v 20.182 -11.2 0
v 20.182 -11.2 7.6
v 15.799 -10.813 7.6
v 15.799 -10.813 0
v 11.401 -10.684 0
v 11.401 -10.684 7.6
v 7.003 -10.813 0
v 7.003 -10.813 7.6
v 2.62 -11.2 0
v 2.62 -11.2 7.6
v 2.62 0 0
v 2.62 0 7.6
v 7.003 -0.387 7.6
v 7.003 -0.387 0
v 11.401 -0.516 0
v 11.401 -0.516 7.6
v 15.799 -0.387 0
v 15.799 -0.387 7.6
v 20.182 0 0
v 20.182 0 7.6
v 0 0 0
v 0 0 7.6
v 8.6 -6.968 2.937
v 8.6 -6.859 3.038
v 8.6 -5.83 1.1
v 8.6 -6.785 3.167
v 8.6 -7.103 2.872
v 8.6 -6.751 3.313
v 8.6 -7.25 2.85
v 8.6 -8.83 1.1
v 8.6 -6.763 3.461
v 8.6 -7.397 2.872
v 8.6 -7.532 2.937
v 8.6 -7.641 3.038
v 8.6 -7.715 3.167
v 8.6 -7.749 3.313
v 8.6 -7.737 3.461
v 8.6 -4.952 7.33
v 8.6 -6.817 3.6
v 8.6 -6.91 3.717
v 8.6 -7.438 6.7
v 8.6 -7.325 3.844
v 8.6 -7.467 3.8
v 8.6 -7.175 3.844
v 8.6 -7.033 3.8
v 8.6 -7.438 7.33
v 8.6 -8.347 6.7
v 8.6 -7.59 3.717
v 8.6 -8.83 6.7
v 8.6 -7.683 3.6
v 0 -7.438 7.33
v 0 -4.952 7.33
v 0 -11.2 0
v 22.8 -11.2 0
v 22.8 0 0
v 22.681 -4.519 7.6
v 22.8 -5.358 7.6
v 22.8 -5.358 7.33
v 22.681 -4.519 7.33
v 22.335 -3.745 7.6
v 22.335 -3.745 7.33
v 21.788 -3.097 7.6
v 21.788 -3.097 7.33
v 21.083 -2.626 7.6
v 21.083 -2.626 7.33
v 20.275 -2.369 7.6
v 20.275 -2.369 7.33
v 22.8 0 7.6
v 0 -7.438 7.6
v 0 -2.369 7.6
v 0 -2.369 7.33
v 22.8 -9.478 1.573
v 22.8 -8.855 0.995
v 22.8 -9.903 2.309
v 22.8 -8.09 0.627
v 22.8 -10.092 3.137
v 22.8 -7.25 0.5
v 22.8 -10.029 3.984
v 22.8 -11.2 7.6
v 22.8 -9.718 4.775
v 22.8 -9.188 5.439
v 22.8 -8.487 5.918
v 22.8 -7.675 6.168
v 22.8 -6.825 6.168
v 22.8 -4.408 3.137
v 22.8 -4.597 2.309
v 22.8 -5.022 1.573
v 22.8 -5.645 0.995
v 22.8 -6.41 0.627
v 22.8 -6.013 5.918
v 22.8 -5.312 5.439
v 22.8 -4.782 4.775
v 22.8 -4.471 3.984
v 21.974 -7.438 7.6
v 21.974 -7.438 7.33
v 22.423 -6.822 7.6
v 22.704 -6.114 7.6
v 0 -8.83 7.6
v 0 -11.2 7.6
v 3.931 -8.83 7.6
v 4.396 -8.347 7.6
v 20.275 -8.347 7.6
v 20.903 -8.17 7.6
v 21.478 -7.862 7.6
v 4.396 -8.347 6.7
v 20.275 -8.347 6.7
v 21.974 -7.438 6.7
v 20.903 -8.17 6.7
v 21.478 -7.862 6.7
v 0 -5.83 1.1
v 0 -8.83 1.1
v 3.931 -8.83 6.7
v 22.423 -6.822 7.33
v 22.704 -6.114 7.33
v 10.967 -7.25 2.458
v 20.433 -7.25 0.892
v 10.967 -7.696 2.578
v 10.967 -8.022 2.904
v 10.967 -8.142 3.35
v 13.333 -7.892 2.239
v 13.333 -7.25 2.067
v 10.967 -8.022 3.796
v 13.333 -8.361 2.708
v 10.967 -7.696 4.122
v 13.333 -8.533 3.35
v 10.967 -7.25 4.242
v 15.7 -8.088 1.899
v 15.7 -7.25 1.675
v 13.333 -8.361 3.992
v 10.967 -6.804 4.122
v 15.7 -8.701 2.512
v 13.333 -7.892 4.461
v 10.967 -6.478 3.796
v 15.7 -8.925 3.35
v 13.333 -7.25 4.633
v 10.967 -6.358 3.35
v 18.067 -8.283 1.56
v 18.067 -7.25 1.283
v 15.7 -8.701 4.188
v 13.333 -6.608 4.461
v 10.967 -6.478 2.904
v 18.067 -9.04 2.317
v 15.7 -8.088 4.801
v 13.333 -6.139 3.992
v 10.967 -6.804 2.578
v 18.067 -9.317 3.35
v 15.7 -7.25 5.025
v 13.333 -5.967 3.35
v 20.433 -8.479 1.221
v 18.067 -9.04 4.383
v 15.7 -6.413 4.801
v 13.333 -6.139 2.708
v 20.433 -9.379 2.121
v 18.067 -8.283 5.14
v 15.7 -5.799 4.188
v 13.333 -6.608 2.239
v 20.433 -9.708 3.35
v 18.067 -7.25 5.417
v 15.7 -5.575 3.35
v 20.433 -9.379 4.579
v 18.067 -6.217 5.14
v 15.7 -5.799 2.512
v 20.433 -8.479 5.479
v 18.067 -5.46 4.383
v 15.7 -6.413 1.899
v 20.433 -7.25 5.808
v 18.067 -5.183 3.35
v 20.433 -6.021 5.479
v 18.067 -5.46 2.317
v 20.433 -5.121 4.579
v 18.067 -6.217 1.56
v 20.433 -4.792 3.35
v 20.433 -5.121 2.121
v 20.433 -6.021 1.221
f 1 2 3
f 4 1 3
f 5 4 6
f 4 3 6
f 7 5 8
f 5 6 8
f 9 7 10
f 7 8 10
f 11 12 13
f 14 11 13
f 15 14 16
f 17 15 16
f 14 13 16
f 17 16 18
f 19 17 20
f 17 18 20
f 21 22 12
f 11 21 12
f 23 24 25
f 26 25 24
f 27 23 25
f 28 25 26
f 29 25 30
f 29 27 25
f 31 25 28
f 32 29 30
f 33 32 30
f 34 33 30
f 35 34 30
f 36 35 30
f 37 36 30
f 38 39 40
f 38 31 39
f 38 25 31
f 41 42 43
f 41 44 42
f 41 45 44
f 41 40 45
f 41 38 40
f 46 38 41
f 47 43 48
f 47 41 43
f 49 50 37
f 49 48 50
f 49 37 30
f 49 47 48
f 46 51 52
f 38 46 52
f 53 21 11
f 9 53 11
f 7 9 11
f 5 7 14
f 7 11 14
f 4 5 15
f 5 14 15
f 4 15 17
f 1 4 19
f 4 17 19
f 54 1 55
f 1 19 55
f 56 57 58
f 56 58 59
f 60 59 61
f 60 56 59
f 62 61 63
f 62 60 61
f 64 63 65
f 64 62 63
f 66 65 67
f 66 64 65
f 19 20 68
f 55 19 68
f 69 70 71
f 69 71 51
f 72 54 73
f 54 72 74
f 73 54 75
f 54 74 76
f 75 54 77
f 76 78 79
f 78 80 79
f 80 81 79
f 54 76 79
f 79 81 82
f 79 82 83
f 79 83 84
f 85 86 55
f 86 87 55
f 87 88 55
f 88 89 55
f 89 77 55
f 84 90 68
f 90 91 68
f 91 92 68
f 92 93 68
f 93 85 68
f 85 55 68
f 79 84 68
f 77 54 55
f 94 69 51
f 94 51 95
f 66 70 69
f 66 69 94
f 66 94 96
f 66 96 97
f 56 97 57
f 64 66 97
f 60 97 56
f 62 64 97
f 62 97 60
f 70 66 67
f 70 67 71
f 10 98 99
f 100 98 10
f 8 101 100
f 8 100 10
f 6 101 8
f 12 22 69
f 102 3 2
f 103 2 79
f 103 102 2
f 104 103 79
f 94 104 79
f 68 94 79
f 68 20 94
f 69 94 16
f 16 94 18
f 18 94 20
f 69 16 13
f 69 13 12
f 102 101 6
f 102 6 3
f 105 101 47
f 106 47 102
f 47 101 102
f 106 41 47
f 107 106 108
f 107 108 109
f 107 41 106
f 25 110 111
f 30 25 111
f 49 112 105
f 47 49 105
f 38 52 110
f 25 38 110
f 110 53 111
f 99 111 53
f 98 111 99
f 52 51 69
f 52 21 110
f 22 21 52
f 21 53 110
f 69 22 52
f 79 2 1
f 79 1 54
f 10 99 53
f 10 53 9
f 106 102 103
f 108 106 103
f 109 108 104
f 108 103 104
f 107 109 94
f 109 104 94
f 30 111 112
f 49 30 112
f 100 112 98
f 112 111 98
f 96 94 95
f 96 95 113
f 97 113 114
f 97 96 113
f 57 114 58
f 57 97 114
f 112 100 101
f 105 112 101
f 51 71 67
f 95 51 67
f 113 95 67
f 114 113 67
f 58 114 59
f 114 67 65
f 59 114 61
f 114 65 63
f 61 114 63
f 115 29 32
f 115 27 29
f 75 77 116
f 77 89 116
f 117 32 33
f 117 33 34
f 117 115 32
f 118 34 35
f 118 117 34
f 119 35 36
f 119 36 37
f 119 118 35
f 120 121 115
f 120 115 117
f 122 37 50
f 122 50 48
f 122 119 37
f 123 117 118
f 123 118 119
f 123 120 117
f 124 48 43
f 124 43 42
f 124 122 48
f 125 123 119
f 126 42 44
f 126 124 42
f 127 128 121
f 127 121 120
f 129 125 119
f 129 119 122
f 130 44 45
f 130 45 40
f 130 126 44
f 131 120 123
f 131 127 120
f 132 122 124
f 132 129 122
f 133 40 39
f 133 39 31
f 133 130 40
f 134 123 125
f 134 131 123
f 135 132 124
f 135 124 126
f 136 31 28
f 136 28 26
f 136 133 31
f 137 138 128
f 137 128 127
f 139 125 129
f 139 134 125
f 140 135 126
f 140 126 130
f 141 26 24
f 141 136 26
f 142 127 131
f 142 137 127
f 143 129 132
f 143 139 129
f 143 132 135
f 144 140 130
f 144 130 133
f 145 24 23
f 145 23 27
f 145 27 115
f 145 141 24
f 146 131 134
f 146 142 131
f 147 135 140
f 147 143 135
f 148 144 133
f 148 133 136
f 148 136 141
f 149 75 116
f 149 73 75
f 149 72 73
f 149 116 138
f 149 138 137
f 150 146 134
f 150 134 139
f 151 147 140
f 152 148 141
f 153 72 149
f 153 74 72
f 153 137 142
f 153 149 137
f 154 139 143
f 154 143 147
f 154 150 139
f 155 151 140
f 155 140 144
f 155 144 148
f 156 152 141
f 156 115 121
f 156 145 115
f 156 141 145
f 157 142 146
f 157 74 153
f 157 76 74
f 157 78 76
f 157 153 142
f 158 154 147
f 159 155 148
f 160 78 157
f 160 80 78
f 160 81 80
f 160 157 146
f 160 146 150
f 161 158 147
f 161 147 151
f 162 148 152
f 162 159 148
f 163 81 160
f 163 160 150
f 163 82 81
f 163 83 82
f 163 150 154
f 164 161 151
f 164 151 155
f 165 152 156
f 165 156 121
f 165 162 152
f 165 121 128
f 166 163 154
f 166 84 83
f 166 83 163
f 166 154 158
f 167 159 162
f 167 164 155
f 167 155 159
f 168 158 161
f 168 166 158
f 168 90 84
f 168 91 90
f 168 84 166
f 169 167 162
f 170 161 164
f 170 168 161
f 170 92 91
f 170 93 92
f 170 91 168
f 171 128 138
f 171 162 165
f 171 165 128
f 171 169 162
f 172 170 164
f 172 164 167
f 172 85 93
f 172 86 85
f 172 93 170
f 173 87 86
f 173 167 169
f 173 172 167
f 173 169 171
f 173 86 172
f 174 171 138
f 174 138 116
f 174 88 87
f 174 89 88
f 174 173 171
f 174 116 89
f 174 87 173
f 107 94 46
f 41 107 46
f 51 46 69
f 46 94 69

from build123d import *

# Parameters (mm, degrees)
F0_W      = 22.8
F0_H      = 7.6
F1_DEPTH  = 11.2
F7_DEPTH  = 0.9
F9_DEPTH  = 8.6
F10_DEPTH = 7.6
F11_DEPTH = 7.6
F12_DEPTH = 0.27


with BuildPart() as f1:
    # F0 (on Front) → F1 (new body)
    with BuildSketch(Plane.XZ):
        with Locations((11.4, 3.8)):
            Rectangle(F0_W, F0_H)
    extrude(amount=F1_DEPTH)

    # F4 (on offset) → F5 (revolve, cut)
    with BuildSketch(Plane.XZ.offset(7.25)):
        Polygon((8.6, 2.85), (22.8, 0.5), (22.8, 3.35), (8.6, 3.35), align=None)
    revolve(axis=Axis((15.7, -7.25, 3.35), (-1, 0, 0)), mode=Mode.SUBTRACT)

    # F6 (on face) → F7 (cut)
    with BuildSketch(Plane.XY.offset(7.6)):
        with BuildLine():
            Line((21.9739718918, -7.4381930754), (0, -7.4381930754))
            Line((0, -7.4381930754), (0, -8.83))
            Line((0, -8.83), (3.9305342361, -8.83))
            Line((3.9305342361, -8.83), (4.396331734, -8.3473995328))
            Line((4.396331734, -8.3473995328), (20.2752824453, -8.3473995328))
            ThreePointArc((20.2752824453, -8.3473995328), (21.1987672729, -8.0313138122), (21.9739718918, -7.4381930754))
        make_face()
    extrude(amount=-F7_DEPTH, mode=Mode.SUBTRACT)

    # F8 (on face) → F9 (cut)
    with BuildSketch(Plane(origin=(0, 0, 0), x_dir=(0, -1, 0), z_dir=(-1, 0, 0))):
        Polygon((4.9516418949, 7.3297983035), (5.83, 1.1), (8.83, 1.1), (8.83, 6.7), (7.4381930754, 6.7), (7.4381930754, 7.3297983035), align=None)
    extrude(amount=-F9_DEPTH, mode=Mode.SUBTRACT)

    # F6 (on face) → F10 (cut)
    with BuildSketch(Plane.XY.offset(7.6)):
        with BuildLine():
            Line((2.6200045832, -11.2), (20.1820470393, -11.2))
            ThreePointArc((20.1820470393, -11.2), (11.4010258112, -10.6841840003), (2.6200045832, -11.2))
        make_face()
    extrude(amount=-F10_DEPTH, mode=Mode.SUBTRACT)

    # F6 (on face) → F11 (cut)
    with BuildSketch(Plane.XY.offset(7.6)):
        with BuildLine():
            Line((20.1820470393, 0), (2.6200045832, 0))
            ThreePointArc((2.6200045832, 0), (11.4010258112, -0.5158159997), (20.1820470393, 0))
        make_face()
    extrude(amount=-F11_DEPTH, mode=Mode.SUBTRACT)


with BuildPart() as f12:
    # F6 (on face) → F12 (new body)
    with BuildSketch(Plane.XY.offset(7.6)):
        with BuildLine():
            Line((20.2752824453, -2.3688024376), (0, -2.3688024376))
            Line((0, -2.3688024376), (0, -7.4381930754))
            Line((0, -7.4381930754), (21.9739718918, -7.4381930754))
            ThreePointArc((21.9739718918, -7.4381930754), (22.5859364858, -6.4771525411), (22.8, -5.3581009852))
            ThreePointArc((22.8, -5.3581009852), (22.0843677289, -3.4016945513), (20.2752824453, -2.3688024376))
        make_face()
    extrude(amount=-F12_DEPTH)


solid = Compound([f1.part, f12.part])
